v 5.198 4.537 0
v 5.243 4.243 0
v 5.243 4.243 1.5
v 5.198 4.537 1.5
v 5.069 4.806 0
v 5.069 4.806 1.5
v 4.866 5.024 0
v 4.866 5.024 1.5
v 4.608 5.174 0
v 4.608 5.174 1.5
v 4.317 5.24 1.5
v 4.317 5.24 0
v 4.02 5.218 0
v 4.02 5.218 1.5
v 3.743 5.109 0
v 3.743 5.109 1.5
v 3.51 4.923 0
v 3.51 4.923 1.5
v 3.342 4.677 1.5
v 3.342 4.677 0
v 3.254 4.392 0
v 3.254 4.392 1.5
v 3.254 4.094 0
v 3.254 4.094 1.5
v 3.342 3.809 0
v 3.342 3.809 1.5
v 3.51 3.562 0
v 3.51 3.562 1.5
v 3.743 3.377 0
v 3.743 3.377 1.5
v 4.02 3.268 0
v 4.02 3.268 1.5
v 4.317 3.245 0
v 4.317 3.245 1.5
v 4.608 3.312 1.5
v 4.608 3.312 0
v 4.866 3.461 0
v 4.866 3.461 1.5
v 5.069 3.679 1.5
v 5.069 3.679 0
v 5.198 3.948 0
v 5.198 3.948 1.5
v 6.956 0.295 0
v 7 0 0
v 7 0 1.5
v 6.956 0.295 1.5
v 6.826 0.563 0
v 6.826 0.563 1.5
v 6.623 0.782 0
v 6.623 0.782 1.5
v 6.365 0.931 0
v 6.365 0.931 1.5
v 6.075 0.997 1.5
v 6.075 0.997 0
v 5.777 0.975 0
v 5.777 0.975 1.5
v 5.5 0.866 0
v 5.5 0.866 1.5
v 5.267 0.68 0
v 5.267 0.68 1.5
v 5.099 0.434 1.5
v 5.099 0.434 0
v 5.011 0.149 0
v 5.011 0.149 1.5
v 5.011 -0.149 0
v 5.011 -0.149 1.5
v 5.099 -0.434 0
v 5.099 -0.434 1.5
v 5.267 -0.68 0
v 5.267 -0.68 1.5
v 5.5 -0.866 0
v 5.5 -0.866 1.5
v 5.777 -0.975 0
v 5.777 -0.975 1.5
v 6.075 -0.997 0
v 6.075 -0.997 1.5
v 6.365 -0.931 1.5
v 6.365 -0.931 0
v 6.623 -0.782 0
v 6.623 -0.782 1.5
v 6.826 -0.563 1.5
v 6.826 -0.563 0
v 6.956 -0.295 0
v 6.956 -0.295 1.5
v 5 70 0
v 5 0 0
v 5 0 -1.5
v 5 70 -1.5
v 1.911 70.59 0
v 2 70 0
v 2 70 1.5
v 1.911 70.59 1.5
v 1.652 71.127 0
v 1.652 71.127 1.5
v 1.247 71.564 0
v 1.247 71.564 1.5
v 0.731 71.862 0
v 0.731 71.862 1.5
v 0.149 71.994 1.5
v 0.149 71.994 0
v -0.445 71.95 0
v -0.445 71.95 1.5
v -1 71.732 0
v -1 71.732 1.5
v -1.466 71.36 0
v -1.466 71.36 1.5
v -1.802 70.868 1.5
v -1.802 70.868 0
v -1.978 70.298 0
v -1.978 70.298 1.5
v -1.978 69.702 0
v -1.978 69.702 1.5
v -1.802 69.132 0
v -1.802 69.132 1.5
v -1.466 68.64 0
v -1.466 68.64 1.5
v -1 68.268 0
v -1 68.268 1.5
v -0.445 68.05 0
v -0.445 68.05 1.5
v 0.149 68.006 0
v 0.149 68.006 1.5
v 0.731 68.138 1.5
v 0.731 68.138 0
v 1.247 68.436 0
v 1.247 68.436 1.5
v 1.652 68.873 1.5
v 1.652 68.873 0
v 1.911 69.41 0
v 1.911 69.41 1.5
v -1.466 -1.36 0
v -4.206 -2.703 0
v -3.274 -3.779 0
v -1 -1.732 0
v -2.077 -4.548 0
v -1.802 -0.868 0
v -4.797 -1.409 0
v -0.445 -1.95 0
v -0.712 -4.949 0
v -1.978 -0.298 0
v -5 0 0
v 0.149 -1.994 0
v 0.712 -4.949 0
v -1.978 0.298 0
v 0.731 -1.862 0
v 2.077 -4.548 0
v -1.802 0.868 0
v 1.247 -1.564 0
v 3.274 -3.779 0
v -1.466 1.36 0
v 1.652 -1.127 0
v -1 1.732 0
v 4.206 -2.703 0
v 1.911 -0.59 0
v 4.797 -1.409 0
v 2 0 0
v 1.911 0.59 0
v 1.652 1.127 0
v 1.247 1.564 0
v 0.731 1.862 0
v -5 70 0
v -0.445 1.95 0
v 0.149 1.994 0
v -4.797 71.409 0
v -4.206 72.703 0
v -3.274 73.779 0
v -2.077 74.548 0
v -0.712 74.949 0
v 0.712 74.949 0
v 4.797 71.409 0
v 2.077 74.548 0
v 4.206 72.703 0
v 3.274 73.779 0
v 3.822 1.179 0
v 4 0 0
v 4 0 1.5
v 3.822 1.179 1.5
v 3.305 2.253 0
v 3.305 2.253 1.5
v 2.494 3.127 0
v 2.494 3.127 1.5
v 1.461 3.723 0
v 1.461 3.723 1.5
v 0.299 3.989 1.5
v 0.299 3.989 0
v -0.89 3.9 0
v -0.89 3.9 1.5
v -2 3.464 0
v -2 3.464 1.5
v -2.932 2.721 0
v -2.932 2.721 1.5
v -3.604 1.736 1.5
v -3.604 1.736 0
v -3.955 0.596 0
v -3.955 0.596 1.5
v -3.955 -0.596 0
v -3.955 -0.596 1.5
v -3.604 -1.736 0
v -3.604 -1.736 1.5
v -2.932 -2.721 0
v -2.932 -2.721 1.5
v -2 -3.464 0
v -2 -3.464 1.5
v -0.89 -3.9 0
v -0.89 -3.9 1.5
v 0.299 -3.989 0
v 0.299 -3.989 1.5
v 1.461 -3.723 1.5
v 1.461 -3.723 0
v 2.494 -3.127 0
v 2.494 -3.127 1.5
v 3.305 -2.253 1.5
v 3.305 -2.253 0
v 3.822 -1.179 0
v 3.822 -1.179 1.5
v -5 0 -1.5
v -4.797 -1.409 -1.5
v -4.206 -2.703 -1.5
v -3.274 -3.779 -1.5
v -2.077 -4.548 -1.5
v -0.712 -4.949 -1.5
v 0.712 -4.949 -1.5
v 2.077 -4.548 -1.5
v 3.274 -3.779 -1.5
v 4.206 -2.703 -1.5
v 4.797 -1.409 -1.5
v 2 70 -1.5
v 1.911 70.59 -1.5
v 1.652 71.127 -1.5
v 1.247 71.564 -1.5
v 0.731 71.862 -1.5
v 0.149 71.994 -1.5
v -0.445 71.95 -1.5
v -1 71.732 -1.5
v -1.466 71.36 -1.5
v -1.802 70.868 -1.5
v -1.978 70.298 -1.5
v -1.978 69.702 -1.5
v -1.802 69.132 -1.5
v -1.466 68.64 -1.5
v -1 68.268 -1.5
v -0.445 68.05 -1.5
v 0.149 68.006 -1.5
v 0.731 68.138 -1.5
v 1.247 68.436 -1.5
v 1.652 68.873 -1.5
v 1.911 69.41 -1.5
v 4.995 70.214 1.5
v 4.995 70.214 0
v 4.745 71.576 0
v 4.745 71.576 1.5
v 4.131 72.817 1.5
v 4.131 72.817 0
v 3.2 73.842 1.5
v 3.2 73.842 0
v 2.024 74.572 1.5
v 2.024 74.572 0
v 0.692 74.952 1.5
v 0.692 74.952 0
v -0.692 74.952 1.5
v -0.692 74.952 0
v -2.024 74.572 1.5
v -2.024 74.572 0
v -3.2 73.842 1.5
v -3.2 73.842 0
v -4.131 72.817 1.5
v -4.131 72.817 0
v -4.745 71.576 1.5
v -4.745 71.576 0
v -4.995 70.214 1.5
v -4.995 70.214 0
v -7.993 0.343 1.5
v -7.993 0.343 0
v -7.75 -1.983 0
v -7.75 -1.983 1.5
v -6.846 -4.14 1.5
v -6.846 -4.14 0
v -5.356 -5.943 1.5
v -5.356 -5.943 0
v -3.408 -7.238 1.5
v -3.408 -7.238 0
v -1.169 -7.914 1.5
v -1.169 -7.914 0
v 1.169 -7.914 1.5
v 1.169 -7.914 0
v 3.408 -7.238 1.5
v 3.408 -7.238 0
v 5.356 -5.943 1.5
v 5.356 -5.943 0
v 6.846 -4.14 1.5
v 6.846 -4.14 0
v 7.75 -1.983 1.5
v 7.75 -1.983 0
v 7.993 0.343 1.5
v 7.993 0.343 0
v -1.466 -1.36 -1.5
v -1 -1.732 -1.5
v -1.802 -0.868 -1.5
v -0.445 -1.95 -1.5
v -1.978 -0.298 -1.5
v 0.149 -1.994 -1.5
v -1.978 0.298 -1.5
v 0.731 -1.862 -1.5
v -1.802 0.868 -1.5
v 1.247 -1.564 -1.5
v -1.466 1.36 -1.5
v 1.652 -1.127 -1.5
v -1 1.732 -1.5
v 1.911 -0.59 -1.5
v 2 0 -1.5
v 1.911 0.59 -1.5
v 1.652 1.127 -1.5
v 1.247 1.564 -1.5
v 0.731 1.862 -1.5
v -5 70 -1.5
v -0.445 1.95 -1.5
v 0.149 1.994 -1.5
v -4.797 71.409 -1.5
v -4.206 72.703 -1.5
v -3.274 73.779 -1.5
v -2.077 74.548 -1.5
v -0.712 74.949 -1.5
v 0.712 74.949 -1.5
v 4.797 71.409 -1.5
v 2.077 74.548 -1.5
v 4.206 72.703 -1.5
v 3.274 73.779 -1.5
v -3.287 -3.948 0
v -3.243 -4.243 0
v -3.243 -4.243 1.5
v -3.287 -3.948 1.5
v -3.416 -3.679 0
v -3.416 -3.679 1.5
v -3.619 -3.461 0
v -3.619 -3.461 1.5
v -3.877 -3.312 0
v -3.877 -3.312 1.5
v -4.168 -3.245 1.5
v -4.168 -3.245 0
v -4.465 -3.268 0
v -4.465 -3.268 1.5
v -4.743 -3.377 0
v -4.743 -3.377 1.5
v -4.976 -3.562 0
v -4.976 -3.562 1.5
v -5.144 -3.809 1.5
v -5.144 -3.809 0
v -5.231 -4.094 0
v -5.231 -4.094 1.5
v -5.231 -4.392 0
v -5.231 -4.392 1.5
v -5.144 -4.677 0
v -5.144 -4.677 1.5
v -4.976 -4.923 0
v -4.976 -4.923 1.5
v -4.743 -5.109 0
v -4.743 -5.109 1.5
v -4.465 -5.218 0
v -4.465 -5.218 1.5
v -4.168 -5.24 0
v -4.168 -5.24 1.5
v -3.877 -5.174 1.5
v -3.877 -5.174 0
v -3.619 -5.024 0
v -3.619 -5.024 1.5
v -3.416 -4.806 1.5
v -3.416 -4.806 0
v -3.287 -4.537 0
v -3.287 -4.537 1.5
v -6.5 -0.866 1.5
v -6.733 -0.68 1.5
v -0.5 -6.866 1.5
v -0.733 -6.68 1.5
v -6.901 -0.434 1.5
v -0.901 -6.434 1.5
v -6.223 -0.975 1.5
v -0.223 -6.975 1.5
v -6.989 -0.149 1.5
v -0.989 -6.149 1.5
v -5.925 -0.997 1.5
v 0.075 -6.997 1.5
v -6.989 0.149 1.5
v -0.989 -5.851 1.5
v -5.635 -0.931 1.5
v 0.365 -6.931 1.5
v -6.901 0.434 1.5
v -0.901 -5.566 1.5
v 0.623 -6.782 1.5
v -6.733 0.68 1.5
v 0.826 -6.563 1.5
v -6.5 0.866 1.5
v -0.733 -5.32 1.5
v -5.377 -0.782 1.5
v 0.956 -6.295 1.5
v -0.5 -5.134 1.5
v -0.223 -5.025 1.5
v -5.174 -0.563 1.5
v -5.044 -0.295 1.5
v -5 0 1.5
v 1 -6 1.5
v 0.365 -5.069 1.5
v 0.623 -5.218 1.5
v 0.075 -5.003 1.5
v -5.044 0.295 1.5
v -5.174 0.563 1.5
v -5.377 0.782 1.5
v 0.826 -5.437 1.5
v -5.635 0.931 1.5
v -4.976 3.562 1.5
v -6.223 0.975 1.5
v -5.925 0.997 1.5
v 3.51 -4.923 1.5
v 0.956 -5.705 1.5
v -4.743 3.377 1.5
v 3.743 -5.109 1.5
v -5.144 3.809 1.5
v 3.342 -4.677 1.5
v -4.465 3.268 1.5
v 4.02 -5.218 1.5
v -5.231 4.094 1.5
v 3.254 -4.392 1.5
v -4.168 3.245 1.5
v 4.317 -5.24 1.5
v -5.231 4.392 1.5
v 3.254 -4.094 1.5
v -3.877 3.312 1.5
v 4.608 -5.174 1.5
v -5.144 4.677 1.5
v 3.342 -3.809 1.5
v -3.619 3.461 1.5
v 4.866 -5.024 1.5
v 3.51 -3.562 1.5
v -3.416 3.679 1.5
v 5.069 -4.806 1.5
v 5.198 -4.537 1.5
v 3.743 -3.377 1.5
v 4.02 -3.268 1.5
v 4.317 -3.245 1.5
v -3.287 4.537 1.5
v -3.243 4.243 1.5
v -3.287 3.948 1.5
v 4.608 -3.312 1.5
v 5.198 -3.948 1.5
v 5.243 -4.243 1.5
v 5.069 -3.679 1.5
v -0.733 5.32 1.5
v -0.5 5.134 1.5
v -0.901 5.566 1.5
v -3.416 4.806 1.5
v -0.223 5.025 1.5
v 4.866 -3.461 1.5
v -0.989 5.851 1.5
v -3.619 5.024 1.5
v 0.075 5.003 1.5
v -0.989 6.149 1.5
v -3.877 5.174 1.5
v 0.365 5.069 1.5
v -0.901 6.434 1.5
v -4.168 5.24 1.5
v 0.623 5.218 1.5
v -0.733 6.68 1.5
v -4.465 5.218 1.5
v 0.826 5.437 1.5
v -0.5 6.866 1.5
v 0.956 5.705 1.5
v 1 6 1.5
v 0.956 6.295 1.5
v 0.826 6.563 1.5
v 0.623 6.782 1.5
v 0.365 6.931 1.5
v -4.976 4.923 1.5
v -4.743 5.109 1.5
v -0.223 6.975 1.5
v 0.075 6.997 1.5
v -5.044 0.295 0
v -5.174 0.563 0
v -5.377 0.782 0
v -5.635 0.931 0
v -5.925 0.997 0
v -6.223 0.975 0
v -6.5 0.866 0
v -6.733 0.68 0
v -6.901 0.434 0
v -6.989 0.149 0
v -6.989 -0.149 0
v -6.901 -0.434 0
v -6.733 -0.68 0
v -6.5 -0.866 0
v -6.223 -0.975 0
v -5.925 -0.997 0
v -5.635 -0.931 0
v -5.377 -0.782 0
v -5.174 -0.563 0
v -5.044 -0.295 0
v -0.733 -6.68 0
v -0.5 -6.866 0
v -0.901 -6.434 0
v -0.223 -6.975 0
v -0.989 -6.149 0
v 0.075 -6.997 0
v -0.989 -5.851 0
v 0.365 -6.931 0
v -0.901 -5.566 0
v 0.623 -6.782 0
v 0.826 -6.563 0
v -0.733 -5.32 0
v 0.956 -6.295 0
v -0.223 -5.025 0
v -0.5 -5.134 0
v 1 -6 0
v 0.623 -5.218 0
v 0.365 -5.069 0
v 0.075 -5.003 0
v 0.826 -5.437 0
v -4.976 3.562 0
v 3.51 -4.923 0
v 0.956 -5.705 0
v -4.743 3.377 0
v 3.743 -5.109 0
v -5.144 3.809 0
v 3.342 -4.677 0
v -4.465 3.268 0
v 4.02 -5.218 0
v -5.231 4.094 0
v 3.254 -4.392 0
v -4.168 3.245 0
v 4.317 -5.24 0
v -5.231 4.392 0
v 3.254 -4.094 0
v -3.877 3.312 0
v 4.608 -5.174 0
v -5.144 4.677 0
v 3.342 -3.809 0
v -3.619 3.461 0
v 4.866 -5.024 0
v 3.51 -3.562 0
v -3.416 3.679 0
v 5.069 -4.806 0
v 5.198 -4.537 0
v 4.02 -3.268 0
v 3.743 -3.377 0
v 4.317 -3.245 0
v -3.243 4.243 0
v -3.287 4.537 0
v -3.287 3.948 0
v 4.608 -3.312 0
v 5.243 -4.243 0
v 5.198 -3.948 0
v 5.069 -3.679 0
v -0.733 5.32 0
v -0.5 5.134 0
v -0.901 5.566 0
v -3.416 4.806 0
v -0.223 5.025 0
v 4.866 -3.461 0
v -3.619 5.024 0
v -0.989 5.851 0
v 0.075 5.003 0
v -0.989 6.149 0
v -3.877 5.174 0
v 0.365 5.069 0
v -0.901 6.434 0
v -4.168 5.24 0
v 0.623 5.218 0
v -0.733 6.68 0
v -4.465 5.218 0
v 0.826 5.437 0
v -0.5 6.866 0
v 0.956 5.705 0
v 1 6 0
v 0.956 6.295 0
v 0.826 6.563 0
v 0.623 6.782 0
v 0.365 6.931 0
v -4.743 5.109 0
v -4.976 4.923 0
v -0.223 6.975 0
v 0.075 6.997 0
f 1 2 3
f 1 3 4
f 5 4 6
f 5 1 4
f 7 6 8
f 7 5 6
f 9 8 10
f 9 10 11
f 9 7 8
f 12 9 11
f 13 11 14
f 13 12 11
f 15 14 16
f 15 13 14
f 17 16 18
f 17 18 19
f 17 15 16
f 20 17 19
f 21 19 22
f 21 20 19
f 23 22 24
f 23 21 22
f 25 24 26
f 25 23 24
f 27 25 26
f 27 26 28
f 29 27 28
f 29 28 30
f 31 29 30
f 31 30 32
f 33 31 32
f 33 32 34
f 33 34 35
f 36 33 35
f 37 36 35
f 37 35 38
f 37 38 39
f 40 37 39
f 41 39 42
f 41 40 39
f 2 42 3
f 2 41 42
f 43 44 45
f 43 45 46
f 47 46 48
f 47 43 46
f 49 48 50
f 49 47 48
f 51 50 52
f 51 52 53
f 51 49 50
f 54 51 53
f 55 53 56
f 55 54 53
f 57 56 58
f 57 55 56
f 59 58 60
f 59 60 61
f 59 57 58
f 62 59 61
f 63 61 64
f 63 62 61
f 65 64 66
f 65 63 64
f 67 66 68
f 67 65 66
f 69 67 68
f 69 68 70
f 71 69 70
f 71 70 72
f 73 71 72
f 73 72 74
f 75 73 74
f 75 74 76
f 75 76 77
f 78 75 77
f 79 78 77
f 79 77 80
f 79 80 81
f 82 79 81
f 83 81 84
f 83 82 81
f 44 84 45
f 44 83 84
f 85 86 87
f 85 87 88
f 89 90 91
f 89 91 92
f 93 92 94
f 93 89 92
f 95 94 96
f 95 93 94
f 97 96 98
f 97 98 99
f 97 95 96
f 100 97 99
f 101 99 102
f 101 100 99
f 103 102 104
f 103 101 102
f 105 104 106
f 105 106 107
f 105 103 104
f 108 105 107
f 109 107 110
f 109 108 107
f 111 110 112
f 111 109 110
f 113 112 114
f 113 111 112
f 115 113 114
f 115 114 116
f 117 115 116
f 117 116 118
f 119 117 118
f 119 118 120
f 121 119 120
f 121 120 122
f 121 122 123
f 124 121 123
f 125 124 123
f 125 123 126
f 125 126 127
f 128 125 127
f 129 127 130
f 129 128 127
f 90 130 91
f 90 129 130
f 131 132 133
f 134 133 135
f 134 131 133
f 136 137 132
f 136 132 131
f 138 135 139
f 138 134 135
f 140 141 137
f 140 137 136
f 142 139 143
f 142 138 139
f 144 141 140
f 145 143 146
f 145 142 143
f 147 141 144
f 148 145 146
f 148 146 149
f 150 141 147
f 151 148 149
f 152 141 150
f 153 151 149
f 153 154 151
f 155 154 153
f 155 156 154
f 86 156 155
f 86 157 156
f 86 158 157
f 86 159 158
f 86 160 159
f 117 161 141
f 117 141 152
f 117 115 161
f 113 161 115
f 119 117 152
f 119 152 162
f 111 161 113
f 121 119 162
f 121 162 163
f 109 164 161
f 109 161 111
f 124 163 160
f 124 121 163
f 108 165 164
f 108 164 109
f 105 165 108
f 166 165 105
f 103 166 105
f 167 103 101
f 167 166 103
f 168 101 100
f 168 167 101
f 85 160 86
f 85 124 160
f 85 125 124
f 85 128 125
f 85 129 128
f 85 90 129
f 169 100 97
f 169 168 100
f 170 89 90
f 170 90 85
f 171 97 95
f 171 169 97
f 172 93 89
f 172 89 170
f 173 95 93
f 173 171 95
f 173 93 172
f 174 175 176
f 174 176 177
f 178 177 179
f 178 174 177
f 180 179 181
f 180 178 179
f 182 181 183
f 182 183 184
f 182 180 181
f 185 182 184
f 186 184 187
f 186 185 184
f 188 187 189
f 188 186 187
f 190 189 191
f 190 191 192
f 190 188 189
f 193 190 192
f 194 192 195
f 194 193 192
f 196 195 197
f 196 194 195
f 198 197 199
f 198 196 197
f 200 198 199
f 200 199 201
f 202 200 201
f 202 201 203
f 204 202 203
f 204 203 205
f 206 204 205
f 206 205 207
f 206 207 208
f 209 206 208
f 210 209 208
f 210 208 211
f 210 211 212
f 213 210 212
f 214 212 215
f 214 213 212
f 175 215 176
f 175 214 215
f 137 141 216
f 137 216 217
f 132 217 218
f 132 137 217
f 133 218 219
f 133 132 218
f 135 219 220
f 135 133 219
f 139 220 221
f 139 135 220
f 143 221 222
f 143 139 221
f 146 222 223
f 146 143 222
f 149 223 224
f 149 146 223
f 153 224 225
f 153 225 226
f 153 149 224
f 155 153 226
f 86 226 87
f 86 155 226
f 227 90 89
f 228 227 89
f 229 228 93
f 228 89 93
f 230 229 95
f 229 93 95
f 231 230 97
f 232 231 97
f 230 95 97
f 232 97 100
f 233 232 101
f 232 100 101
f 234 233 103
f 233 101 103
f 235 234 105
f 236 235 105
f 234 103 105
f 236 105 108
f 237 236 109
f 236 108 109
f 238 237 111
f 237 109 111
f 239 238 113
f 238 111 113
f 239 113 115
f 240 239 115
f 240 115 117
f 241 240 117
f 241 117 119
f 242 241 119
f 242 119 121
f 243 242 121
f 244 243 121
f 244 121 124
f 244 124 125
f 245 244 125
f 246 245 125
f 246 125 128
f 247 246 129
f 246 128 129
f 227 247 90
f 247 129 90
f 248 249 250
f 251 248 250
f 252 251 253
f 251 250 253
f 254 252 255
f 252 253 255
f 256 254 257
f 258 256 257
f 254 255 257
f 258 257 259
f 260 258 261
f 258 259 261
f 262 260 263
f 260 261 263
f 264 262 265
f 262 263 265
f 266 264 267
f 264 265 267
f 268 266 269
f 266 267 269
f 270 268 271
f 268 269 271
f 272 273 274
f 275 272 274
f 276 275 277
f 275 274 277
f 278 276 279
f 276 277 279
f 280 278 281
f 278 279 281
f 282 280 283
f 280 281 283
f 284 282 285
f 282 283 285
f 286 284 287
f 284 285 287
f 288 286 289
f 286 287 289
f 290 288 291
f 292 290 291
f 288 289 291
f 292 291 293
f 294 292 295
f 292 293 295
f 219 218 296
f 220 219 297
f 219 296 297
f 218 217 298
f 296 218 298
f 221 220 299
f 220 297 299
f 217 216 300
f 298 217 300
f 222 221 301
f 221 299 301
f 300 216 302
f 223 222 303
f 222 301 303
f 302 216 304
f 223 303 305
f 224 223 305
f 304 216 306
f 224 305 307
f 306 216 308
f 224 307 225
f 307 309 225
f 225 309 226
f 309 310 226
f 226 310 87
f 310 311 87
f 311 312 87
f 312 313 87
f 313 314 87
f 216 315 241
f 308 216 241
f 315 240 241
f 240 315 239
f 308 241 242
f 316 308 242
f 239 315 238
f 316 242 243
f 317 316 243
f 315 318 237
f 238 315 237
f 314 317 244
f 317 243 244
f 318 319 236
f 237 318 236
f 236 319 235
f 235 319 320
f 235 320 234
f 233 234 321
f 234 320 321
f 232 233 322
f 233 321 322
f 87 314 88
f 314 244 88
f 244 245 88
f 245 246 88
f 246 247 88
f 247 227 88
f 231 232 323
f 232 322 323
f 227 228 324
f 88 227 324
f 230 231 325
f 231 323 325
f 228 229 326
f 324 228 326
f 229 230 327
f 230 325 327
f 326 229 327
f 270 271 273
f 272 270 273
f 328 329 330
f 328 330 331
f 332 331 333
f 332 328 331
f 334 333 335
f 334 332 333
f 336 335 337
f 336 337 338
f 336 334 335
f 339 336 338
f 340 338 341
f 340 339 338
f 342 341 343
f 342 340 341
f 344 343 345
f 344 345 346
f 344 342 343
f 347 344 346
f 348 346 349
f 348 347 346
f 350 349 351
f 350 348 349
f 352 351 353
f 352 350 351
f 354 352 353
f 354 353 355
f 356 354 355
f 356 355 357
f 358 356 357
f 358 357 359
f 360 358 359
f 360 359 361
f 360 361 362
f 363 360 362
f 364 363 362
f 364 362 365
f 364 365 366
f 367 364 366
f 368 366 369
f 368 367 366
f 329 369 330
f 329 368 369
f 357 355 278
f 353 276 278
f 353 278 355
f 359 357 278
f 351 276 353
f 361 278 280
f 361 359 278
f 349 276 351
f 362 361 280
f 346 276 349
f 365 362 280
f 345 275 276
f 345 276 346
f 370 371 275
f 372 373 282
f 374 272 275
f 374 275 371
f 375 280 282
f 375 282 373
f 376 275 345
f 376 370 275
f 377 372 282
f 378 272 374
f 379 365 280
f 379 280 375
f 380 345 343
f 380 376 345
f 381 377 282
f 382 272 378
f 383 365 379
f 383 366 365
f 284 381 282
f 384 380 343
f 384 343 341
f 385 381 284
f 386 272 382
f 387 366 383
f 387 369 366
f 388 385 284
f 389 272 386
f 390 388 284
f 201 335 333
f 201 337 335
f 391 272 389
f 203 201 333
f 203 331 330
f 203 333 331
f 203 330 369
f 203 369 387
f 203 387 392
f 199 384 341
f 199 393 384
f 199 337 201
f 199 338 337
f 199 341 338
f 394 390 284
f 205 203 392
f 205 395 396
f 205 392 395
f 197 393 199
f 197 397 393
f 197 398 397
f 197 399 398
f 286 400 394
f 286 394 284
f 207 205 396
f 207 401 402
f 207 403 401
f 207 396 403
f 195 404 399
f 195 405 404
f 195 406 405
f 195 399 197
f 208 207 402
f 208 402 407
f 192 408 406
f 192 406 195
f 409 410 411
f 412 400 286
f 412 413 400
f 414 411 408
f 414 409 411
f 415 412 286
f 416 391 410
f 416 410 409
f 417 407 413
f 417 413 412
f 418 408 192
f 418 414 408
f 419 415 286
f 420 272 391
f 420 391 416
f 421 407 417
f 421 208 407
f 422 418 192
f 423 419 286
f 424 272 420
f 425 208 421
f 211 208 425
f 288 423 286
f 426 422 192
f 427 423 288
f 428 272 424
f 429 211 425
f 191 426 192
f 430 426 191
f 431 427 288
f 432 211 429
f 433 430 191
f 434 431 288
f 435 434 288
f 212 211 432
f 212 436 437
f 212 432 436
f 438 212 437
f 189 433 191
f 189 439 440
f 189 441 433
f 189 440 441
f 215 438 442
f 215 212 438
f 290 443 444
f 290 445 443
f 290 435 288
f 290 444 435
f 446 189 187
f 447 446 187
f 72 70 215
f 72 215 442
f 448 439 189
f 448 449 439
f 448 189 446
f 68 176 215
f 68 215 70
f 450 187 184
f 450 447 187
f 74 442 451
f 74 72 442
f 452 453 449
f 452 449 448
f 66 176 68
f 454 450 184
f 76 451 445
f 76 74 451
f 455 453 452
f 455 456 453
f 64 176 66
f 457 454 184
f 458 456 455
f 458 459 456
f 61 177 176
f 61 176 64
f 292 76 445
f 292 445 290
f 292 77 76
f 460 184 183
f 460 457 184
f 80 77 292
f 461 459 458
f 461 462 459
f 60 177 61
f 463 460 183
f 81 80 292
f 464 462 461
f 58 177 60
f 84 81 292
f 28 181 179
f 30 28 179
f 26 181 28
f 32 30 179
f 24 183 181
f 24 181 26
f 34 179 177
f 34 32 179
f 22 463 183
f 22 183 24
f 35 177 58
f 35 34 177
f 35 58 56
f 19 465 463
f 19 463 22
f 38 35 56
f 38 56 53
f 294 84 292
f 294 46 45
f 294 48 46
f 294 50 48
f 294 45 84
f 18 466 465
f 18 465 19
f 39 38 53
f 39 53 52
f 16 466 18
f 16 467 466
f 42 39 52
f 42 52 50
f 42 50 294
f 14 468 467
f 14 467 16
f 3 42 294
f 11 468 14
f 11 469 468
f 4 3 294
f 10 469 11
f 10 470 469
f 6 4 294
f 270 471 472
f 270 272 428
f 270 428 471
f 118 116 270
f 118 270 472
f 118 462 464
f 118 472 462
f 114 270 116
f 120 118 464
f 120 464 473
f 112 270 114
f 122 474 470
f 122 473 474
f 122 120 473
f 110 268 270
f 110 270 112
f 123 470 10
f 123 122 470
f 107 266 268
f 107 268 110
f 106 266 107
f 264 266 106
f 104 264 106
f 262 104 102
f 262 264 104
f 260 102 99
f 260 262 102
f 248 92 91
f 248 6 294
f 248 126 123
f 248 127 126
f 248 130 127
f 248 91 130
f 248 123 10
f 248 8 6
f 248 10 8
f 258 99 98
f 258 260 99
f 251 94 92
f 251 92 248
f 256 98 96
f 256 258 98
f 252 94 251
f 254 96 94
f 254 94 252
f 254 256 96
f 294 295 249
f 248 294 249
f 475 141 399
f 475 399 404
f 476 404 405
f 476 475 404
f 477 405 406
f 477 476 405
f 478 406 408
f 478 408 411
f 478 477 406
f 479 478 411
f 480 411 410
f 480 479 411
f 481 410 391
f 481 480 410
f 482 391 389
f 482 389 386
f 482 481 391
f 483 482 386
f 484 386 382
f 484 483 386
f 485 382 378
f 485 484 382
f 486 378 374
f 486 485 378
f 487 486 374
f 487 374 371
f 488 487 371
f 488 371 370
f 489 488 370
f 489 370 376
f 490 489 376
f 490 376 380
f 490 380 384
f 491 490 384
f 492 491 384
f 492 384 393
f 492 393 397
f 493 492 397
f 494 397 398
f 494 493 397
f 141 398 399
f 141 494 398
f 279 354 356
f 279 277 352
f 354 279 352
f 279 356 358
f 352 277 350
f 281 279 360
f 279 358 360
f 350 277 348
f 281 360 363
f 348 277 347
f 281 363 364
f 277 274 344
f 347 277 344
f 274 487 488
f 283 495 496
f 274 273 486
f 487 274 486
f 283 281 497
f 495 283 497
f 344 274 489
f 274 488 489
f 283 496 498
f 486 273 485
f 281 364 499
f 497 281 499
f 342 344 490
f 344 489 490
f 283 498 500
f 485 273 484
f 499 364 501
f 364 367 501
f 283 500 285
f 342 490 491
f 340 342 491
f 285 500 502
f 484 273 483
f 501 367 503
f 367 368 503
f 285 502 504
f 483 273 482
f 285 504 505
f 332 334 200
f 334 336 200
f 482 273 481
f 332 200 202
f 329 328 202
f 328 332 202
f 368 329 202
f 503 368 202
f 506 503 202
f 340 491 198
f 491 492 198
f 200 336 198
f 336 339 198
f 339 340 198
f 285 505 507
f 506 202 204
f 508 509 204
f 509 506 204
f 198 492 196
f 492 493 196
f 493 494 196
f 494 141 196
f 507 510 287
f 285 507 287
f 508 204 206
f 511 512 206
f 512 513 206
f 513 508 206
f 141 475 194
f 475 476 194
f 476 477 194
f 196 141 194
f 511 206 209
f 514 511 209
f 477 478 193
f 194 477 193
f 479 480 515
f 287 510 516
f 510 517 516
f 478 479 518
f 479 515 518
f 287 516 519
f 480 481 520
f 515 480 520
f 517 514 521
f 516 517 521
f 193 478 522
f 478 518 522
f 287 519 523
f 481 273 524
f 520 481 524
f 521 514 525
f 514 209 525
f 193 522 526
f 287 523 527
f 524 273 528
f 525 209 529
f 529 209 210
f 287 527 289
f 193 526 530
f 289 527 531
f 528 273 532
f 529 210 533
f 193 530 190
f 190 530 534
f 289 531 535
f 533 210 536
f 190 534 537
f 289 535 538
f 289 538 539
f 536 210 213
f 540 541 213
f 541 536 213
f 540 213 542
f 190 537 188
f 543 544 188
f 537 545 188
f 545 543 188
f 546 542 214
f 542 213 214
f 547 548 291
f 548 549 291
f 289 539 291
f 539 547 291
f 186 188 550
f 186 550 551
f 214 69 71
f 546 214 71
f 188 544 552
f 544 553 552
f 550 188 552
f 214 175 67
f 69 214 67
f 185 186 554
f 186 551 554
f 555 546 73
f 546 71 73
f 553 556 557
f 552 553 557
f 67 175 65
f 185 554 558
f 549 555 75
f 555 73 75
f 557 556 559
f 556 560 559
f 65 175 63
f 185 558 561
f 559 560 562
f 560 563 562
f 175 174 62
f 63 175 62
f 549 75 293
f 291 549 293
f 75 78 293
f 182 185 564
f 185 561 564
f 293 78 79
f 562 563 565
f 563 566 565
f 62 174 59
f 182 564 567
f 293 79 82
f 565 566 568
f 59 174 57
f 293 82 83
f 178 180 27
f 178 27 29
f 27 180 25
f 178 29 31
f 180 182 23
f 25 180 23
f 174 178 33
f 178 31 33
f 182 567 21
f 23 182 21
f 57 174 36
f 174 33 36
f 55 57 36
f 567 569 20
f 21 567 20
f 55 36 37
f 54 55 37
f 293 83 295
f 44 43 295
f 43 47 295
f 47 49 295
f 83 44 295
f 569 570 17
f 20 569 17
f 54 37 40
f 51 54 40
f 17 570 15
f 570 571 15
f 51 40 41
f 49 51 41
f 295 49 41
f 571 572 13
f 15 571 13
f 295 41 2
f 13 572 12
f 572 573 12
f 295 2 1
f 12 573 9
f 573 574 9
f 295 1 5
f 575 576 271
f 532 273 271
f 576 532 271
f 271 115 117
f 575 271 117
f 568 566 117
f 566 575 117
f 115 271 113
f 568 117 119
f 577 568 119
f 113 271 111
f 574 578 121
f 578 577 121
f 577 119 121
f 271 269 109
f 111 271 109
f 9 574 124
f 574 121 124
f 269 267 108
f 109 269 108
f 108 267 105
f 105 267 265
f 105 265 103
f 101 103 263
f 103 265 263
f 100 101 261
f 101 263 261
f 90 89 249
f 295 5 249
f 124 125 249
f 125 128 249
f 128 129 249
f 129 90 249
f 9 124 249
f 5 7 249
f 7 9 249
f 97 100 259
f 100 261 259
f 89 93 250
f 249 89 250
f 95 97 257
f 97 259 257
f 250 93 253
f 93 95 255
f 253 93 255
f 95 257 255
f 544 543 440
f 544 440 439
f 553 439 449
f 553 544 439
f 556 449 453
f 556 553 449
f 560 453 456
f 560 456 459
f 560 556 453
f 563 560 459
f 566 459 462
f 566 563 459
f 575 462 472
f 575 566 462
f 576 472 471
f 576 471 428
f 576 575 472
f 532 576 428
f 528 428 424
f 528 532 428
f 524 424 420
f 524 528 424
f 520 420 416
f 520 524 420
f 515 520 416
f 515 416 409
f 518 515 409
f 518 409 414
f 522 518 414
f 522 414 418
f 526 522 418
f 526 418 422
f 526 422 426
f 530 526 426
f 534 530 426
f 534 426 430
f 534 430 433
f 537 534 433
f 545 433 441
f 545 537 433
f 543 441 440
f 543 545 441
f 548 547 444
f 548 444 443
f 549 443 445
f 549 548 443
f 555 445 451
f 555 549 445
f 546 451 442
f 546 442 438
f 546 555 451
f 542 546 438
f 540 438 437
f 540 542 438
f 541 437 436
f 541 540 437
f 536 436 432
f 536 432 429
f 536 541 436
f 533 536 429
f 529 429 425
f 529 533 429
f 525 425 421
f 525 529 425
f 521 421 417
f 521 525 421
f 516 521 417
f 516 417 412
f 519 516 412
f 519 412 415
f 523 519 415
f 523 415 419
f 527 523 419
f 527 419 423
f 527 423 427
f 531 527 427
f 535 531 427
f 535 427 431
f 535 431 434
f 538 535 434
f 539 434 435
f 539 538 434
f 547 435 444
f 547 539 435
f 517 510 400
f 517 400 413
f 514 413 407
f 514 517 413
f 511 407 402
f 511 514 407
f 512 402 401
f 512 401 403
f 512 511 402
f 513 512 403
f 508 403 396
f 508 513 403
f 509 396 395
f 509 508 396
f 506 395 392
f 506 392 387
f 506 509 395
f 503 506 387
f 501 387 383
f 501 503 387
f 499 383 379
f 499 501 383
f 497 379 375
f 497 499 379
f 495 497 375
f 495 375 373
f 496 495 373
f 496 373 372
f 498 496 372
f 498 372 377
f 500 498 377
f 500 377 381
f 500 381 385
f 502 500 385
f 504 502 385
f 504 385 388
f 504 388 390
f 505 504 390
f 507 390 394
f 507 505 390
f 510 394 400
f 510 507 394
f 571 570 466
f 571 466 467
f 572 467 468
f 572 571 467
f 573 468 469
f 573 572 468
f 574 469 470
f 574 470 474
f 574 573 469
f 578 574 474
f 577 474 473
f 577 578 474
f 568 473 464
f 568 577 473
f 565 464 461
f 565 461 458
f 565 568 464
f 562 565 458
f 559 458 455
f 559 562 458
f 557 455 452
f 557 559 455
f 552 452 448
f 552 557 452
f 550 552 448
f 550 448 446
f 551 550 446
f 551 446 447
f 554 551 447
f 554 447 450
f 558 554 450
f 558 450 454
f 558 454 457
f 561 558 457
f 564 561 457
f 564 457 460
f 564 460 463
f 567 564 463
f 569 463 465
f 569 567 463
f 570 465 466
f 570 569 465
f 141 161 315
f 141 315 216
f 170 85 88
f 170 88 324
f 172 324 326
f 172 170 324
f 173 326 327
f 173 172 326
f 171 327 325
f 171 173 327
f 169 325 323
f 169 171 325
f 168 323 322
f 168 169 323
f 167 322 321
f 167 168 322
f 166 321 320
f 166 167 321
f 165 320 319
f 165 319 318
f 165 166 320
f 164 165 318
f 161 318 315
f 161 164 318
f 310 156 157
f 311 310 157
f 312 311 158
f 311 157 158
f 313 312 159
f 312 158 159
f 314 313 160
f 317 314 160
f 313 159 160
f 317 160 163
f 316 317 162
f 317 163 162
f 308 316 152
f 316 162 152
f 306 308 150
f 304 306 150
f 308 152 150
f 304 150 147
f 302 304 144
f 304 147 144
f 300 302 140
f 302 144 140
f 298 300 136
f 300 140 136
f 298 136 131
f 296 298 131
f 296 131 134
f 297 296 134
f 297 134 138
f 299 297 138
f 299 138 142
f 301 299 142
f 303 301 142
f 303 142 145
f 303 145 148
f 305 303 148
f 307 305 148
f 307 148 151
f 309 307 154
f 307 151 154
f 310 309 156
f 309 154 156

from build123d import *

# Parameters (mm, degrees)
F0_R     = 1
F0_R_2   = 4
F0_R_3   = 2
F1_DEPTH = 1.5
F2_R     = 2
F3_DEPTH = 1.5


with BuildPart() as f1:
    # F0 (on Top) → F1 (new body)
    with BuildSketch(Plane.XY):
        with BuildLine():
            Line((-4.995406, 70.214286), (-7.99265, 0.342857))
            ThreePointArc((-7.99265, 0.342857), (0, -8), (7.99265, 0.342857))
            Line((7.99265, 0.342857), (4.995406, 70.214286))
            ThreePointArc((4.995406, 70.214286), (0, 75), (-4.995406, 70.214286))
        make_face()
        with Locations((-4.242641, -4.242641)):
            Circle(F0_R, mode=Mode.SUBTRACT)
        with Locations((-6, 0)):
            Circle(F0_R, mode=Mode.SUBTRACT)
        with Locations((-4.242641, 4.242641)):
            Circle(F0_R, mode=Mode.SUBTRACT)
        with Locations((0, -6)):
            Circle(F0_R, mode=Mode.SUBTRACT)
        Circle(F0_R_2, mode=Mode.SUBTRACT)
        with Locations((0, 6)):
            Circle(F0_R, mode=Mode.SUBTRACT)
        with Locations((4.242641, -4.242641)):
            Circle(F0_R, mode=Mode.SUBTRACT)
        with Locations((6, 0)):
            Circle(F0_R, mode=Mode.SUBTRACT)
        with Locations((4.242641, 4.242641)):
            Circle(F0_R, mode=Mode.SUBTRACT)
        with Locations((0, 70)):
            Circle(F0_R_3, mode=Mode.SUBTRACT)
    extrude(amount=F1_DEPTH)


with BuildPart() as f3:
    # F2 (on Top) → F3 (new body)
    with BuildSketch(Plane.XY):
        with BuildLine():
            Line((5, 35), (5, 70))
            ThreePointArc((5, 70), (0, 75), (-5, 70))
            Line((-5, 70), (-5, 35))
            Line((-5, 35), (-5, 0))
            ThreePointArc((-5, 0), (0, -5), (5, 0))
            Line((5, 0), (5, 35))
        make_face()
        Circle(F2_R, mode=Mode.SUBTRACT)
        with Locations((0, 70)):
            Circle(F2_R, mode=Mode.SUBTRACT)
    extrude(amount=-F3_DEPTH)


solid = Compound([f1.part, f3.part])
